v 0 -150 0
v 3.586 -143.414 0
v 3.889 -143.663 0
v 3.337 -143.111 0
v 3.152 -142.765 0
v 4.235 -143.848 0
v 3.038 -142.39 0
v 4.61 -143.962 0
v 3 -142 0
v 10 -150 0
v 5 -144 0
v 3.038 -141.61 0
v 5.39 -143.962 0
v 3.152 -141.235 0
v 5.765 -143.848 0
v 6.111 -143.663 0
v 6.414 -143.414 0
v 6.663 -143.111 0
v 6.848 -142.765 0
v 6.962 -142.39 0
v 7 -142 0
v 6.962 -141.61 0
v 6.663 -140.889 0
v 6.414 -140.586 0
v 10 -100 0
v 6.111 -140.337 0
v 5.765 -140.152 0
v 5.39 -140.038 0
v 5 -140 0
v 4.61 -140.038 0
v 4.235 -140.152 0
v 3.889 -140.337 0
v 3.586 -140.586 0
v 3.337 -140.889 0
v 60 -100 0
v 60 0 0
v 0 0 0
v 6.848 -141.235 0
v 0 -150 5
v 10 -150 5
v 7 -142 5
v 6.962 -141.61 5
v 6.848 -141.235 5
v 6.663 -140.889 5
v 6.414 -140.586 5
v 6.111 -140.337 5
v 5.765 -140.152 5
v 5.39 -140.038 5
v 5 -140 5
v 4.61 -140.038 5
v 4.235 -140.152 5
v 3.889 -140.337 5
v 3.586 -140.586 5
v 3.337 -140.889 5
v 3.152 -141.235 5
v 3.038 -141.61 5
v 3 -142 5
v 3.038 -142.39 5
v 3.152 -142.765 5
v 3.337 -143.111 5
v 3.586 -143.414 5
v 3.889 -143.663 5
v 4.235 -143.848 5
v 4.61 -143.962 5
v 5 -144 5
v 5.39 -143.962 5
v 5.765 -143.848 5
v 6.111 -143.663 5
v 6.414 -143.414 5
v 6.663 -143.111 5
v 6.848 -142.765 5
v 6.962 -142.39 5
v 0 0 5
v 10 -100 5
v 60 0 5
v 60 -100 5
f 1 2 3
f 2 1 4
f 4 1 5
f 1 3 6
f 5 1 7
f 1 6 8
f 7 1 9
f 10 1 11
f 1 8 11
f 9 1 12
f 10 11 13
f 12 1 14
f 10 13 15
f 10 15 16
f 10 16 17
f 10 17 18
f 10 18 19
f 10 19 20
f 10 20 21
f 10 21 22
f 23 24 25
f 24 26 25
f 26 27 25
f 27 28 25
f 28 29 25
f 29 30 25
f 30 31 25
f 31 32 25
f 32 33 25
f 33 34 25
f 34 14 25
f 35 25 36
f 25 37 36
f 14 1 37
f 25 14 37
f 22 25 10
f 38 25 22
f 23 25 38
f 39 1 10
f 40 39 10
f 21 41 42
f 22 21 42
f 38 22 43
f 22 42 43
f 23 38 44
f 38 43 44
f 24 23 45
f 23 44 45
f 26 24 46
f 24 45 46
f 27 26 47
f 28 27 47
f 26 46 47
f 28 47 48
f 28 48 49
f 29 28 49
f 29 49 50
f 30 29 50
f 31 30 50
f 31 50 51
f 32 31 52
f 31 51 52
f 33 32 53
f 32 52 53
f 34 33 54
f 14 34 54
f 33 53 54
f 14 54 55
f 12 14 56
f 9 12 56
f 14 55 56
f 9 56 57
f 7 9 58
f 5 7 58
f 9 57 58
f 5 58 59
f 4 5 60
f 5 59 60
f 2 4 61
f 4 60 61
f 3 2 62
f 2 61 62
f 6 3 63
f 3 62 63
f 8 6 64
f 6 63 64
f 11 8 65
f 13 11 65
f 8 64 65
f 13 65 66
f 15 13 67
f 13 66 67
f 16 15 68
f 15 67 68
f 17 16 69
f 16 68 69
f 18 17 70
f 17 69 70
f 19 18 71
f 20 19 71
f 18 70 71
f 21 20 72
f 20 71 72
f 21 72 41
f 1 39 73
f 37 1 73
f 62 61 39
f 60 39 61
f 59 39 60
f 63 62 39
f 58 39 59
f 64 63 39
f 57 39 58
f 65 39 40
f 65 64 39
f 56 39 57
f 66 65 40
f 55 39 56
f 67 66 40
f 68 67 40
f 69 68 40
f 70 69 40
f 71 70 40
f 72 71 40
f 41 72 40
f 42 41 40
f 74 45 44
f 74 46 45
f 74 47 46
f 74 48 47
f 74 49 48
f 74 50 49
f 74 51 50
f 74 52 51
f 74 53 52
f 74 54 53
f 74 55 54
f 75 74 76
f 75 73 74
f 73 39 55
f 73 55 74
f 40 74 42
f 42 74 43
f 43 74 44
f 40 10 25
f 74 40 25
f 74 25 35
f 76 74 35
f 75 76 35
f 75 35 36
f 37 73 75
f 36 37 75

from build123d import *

# Parameters (mm, degrees)
BOSS_EXTRU_1_DEPTH      = 5
ESQUISSE2_W             = 60
ESQUISSE2_H             = 50
BOSS_EXTRU_2_DEPTH      = 5
ESQUISSE3_R             = 2
ENL_V_MAT_EXTRU_1_DEPTH = 5


with BuildPart() as part:
    # Esquisse1 → Boss.-Extru.1 (new body)
    with BuildSketch(Plane.XY):
        Polygon((60, -50), (0, -50), (0, -150), (10, -150), (10, -100), (60, -100), align=None)
    extrude(amount=BOSS_EXTRU_1_DEPTH)

    # Esquisse2 → Boss.-Extru.2 (add)
    with BuildSketch(Plane.XY.offset(5)):
        with Locations((30, -25)):
            Rectangle(ESQUISSE2_W, ESQUISSE2_H)
    extrude(amount=-BOSS_EXTRU_2_DEPTH)

    # Esquisse3 → Enlèv. mat.-Extru.1 (cut)
    with BuildSketch(Plane.XY.offset(5)):
        with Locations((5, -142)):
            Circle(ESQUISSE3_R)
    extrude(amount=-ENL_V_MAT_EXTRU_1_DEPTH, mode=Mode.SUBTRACT)


solid = part.part
